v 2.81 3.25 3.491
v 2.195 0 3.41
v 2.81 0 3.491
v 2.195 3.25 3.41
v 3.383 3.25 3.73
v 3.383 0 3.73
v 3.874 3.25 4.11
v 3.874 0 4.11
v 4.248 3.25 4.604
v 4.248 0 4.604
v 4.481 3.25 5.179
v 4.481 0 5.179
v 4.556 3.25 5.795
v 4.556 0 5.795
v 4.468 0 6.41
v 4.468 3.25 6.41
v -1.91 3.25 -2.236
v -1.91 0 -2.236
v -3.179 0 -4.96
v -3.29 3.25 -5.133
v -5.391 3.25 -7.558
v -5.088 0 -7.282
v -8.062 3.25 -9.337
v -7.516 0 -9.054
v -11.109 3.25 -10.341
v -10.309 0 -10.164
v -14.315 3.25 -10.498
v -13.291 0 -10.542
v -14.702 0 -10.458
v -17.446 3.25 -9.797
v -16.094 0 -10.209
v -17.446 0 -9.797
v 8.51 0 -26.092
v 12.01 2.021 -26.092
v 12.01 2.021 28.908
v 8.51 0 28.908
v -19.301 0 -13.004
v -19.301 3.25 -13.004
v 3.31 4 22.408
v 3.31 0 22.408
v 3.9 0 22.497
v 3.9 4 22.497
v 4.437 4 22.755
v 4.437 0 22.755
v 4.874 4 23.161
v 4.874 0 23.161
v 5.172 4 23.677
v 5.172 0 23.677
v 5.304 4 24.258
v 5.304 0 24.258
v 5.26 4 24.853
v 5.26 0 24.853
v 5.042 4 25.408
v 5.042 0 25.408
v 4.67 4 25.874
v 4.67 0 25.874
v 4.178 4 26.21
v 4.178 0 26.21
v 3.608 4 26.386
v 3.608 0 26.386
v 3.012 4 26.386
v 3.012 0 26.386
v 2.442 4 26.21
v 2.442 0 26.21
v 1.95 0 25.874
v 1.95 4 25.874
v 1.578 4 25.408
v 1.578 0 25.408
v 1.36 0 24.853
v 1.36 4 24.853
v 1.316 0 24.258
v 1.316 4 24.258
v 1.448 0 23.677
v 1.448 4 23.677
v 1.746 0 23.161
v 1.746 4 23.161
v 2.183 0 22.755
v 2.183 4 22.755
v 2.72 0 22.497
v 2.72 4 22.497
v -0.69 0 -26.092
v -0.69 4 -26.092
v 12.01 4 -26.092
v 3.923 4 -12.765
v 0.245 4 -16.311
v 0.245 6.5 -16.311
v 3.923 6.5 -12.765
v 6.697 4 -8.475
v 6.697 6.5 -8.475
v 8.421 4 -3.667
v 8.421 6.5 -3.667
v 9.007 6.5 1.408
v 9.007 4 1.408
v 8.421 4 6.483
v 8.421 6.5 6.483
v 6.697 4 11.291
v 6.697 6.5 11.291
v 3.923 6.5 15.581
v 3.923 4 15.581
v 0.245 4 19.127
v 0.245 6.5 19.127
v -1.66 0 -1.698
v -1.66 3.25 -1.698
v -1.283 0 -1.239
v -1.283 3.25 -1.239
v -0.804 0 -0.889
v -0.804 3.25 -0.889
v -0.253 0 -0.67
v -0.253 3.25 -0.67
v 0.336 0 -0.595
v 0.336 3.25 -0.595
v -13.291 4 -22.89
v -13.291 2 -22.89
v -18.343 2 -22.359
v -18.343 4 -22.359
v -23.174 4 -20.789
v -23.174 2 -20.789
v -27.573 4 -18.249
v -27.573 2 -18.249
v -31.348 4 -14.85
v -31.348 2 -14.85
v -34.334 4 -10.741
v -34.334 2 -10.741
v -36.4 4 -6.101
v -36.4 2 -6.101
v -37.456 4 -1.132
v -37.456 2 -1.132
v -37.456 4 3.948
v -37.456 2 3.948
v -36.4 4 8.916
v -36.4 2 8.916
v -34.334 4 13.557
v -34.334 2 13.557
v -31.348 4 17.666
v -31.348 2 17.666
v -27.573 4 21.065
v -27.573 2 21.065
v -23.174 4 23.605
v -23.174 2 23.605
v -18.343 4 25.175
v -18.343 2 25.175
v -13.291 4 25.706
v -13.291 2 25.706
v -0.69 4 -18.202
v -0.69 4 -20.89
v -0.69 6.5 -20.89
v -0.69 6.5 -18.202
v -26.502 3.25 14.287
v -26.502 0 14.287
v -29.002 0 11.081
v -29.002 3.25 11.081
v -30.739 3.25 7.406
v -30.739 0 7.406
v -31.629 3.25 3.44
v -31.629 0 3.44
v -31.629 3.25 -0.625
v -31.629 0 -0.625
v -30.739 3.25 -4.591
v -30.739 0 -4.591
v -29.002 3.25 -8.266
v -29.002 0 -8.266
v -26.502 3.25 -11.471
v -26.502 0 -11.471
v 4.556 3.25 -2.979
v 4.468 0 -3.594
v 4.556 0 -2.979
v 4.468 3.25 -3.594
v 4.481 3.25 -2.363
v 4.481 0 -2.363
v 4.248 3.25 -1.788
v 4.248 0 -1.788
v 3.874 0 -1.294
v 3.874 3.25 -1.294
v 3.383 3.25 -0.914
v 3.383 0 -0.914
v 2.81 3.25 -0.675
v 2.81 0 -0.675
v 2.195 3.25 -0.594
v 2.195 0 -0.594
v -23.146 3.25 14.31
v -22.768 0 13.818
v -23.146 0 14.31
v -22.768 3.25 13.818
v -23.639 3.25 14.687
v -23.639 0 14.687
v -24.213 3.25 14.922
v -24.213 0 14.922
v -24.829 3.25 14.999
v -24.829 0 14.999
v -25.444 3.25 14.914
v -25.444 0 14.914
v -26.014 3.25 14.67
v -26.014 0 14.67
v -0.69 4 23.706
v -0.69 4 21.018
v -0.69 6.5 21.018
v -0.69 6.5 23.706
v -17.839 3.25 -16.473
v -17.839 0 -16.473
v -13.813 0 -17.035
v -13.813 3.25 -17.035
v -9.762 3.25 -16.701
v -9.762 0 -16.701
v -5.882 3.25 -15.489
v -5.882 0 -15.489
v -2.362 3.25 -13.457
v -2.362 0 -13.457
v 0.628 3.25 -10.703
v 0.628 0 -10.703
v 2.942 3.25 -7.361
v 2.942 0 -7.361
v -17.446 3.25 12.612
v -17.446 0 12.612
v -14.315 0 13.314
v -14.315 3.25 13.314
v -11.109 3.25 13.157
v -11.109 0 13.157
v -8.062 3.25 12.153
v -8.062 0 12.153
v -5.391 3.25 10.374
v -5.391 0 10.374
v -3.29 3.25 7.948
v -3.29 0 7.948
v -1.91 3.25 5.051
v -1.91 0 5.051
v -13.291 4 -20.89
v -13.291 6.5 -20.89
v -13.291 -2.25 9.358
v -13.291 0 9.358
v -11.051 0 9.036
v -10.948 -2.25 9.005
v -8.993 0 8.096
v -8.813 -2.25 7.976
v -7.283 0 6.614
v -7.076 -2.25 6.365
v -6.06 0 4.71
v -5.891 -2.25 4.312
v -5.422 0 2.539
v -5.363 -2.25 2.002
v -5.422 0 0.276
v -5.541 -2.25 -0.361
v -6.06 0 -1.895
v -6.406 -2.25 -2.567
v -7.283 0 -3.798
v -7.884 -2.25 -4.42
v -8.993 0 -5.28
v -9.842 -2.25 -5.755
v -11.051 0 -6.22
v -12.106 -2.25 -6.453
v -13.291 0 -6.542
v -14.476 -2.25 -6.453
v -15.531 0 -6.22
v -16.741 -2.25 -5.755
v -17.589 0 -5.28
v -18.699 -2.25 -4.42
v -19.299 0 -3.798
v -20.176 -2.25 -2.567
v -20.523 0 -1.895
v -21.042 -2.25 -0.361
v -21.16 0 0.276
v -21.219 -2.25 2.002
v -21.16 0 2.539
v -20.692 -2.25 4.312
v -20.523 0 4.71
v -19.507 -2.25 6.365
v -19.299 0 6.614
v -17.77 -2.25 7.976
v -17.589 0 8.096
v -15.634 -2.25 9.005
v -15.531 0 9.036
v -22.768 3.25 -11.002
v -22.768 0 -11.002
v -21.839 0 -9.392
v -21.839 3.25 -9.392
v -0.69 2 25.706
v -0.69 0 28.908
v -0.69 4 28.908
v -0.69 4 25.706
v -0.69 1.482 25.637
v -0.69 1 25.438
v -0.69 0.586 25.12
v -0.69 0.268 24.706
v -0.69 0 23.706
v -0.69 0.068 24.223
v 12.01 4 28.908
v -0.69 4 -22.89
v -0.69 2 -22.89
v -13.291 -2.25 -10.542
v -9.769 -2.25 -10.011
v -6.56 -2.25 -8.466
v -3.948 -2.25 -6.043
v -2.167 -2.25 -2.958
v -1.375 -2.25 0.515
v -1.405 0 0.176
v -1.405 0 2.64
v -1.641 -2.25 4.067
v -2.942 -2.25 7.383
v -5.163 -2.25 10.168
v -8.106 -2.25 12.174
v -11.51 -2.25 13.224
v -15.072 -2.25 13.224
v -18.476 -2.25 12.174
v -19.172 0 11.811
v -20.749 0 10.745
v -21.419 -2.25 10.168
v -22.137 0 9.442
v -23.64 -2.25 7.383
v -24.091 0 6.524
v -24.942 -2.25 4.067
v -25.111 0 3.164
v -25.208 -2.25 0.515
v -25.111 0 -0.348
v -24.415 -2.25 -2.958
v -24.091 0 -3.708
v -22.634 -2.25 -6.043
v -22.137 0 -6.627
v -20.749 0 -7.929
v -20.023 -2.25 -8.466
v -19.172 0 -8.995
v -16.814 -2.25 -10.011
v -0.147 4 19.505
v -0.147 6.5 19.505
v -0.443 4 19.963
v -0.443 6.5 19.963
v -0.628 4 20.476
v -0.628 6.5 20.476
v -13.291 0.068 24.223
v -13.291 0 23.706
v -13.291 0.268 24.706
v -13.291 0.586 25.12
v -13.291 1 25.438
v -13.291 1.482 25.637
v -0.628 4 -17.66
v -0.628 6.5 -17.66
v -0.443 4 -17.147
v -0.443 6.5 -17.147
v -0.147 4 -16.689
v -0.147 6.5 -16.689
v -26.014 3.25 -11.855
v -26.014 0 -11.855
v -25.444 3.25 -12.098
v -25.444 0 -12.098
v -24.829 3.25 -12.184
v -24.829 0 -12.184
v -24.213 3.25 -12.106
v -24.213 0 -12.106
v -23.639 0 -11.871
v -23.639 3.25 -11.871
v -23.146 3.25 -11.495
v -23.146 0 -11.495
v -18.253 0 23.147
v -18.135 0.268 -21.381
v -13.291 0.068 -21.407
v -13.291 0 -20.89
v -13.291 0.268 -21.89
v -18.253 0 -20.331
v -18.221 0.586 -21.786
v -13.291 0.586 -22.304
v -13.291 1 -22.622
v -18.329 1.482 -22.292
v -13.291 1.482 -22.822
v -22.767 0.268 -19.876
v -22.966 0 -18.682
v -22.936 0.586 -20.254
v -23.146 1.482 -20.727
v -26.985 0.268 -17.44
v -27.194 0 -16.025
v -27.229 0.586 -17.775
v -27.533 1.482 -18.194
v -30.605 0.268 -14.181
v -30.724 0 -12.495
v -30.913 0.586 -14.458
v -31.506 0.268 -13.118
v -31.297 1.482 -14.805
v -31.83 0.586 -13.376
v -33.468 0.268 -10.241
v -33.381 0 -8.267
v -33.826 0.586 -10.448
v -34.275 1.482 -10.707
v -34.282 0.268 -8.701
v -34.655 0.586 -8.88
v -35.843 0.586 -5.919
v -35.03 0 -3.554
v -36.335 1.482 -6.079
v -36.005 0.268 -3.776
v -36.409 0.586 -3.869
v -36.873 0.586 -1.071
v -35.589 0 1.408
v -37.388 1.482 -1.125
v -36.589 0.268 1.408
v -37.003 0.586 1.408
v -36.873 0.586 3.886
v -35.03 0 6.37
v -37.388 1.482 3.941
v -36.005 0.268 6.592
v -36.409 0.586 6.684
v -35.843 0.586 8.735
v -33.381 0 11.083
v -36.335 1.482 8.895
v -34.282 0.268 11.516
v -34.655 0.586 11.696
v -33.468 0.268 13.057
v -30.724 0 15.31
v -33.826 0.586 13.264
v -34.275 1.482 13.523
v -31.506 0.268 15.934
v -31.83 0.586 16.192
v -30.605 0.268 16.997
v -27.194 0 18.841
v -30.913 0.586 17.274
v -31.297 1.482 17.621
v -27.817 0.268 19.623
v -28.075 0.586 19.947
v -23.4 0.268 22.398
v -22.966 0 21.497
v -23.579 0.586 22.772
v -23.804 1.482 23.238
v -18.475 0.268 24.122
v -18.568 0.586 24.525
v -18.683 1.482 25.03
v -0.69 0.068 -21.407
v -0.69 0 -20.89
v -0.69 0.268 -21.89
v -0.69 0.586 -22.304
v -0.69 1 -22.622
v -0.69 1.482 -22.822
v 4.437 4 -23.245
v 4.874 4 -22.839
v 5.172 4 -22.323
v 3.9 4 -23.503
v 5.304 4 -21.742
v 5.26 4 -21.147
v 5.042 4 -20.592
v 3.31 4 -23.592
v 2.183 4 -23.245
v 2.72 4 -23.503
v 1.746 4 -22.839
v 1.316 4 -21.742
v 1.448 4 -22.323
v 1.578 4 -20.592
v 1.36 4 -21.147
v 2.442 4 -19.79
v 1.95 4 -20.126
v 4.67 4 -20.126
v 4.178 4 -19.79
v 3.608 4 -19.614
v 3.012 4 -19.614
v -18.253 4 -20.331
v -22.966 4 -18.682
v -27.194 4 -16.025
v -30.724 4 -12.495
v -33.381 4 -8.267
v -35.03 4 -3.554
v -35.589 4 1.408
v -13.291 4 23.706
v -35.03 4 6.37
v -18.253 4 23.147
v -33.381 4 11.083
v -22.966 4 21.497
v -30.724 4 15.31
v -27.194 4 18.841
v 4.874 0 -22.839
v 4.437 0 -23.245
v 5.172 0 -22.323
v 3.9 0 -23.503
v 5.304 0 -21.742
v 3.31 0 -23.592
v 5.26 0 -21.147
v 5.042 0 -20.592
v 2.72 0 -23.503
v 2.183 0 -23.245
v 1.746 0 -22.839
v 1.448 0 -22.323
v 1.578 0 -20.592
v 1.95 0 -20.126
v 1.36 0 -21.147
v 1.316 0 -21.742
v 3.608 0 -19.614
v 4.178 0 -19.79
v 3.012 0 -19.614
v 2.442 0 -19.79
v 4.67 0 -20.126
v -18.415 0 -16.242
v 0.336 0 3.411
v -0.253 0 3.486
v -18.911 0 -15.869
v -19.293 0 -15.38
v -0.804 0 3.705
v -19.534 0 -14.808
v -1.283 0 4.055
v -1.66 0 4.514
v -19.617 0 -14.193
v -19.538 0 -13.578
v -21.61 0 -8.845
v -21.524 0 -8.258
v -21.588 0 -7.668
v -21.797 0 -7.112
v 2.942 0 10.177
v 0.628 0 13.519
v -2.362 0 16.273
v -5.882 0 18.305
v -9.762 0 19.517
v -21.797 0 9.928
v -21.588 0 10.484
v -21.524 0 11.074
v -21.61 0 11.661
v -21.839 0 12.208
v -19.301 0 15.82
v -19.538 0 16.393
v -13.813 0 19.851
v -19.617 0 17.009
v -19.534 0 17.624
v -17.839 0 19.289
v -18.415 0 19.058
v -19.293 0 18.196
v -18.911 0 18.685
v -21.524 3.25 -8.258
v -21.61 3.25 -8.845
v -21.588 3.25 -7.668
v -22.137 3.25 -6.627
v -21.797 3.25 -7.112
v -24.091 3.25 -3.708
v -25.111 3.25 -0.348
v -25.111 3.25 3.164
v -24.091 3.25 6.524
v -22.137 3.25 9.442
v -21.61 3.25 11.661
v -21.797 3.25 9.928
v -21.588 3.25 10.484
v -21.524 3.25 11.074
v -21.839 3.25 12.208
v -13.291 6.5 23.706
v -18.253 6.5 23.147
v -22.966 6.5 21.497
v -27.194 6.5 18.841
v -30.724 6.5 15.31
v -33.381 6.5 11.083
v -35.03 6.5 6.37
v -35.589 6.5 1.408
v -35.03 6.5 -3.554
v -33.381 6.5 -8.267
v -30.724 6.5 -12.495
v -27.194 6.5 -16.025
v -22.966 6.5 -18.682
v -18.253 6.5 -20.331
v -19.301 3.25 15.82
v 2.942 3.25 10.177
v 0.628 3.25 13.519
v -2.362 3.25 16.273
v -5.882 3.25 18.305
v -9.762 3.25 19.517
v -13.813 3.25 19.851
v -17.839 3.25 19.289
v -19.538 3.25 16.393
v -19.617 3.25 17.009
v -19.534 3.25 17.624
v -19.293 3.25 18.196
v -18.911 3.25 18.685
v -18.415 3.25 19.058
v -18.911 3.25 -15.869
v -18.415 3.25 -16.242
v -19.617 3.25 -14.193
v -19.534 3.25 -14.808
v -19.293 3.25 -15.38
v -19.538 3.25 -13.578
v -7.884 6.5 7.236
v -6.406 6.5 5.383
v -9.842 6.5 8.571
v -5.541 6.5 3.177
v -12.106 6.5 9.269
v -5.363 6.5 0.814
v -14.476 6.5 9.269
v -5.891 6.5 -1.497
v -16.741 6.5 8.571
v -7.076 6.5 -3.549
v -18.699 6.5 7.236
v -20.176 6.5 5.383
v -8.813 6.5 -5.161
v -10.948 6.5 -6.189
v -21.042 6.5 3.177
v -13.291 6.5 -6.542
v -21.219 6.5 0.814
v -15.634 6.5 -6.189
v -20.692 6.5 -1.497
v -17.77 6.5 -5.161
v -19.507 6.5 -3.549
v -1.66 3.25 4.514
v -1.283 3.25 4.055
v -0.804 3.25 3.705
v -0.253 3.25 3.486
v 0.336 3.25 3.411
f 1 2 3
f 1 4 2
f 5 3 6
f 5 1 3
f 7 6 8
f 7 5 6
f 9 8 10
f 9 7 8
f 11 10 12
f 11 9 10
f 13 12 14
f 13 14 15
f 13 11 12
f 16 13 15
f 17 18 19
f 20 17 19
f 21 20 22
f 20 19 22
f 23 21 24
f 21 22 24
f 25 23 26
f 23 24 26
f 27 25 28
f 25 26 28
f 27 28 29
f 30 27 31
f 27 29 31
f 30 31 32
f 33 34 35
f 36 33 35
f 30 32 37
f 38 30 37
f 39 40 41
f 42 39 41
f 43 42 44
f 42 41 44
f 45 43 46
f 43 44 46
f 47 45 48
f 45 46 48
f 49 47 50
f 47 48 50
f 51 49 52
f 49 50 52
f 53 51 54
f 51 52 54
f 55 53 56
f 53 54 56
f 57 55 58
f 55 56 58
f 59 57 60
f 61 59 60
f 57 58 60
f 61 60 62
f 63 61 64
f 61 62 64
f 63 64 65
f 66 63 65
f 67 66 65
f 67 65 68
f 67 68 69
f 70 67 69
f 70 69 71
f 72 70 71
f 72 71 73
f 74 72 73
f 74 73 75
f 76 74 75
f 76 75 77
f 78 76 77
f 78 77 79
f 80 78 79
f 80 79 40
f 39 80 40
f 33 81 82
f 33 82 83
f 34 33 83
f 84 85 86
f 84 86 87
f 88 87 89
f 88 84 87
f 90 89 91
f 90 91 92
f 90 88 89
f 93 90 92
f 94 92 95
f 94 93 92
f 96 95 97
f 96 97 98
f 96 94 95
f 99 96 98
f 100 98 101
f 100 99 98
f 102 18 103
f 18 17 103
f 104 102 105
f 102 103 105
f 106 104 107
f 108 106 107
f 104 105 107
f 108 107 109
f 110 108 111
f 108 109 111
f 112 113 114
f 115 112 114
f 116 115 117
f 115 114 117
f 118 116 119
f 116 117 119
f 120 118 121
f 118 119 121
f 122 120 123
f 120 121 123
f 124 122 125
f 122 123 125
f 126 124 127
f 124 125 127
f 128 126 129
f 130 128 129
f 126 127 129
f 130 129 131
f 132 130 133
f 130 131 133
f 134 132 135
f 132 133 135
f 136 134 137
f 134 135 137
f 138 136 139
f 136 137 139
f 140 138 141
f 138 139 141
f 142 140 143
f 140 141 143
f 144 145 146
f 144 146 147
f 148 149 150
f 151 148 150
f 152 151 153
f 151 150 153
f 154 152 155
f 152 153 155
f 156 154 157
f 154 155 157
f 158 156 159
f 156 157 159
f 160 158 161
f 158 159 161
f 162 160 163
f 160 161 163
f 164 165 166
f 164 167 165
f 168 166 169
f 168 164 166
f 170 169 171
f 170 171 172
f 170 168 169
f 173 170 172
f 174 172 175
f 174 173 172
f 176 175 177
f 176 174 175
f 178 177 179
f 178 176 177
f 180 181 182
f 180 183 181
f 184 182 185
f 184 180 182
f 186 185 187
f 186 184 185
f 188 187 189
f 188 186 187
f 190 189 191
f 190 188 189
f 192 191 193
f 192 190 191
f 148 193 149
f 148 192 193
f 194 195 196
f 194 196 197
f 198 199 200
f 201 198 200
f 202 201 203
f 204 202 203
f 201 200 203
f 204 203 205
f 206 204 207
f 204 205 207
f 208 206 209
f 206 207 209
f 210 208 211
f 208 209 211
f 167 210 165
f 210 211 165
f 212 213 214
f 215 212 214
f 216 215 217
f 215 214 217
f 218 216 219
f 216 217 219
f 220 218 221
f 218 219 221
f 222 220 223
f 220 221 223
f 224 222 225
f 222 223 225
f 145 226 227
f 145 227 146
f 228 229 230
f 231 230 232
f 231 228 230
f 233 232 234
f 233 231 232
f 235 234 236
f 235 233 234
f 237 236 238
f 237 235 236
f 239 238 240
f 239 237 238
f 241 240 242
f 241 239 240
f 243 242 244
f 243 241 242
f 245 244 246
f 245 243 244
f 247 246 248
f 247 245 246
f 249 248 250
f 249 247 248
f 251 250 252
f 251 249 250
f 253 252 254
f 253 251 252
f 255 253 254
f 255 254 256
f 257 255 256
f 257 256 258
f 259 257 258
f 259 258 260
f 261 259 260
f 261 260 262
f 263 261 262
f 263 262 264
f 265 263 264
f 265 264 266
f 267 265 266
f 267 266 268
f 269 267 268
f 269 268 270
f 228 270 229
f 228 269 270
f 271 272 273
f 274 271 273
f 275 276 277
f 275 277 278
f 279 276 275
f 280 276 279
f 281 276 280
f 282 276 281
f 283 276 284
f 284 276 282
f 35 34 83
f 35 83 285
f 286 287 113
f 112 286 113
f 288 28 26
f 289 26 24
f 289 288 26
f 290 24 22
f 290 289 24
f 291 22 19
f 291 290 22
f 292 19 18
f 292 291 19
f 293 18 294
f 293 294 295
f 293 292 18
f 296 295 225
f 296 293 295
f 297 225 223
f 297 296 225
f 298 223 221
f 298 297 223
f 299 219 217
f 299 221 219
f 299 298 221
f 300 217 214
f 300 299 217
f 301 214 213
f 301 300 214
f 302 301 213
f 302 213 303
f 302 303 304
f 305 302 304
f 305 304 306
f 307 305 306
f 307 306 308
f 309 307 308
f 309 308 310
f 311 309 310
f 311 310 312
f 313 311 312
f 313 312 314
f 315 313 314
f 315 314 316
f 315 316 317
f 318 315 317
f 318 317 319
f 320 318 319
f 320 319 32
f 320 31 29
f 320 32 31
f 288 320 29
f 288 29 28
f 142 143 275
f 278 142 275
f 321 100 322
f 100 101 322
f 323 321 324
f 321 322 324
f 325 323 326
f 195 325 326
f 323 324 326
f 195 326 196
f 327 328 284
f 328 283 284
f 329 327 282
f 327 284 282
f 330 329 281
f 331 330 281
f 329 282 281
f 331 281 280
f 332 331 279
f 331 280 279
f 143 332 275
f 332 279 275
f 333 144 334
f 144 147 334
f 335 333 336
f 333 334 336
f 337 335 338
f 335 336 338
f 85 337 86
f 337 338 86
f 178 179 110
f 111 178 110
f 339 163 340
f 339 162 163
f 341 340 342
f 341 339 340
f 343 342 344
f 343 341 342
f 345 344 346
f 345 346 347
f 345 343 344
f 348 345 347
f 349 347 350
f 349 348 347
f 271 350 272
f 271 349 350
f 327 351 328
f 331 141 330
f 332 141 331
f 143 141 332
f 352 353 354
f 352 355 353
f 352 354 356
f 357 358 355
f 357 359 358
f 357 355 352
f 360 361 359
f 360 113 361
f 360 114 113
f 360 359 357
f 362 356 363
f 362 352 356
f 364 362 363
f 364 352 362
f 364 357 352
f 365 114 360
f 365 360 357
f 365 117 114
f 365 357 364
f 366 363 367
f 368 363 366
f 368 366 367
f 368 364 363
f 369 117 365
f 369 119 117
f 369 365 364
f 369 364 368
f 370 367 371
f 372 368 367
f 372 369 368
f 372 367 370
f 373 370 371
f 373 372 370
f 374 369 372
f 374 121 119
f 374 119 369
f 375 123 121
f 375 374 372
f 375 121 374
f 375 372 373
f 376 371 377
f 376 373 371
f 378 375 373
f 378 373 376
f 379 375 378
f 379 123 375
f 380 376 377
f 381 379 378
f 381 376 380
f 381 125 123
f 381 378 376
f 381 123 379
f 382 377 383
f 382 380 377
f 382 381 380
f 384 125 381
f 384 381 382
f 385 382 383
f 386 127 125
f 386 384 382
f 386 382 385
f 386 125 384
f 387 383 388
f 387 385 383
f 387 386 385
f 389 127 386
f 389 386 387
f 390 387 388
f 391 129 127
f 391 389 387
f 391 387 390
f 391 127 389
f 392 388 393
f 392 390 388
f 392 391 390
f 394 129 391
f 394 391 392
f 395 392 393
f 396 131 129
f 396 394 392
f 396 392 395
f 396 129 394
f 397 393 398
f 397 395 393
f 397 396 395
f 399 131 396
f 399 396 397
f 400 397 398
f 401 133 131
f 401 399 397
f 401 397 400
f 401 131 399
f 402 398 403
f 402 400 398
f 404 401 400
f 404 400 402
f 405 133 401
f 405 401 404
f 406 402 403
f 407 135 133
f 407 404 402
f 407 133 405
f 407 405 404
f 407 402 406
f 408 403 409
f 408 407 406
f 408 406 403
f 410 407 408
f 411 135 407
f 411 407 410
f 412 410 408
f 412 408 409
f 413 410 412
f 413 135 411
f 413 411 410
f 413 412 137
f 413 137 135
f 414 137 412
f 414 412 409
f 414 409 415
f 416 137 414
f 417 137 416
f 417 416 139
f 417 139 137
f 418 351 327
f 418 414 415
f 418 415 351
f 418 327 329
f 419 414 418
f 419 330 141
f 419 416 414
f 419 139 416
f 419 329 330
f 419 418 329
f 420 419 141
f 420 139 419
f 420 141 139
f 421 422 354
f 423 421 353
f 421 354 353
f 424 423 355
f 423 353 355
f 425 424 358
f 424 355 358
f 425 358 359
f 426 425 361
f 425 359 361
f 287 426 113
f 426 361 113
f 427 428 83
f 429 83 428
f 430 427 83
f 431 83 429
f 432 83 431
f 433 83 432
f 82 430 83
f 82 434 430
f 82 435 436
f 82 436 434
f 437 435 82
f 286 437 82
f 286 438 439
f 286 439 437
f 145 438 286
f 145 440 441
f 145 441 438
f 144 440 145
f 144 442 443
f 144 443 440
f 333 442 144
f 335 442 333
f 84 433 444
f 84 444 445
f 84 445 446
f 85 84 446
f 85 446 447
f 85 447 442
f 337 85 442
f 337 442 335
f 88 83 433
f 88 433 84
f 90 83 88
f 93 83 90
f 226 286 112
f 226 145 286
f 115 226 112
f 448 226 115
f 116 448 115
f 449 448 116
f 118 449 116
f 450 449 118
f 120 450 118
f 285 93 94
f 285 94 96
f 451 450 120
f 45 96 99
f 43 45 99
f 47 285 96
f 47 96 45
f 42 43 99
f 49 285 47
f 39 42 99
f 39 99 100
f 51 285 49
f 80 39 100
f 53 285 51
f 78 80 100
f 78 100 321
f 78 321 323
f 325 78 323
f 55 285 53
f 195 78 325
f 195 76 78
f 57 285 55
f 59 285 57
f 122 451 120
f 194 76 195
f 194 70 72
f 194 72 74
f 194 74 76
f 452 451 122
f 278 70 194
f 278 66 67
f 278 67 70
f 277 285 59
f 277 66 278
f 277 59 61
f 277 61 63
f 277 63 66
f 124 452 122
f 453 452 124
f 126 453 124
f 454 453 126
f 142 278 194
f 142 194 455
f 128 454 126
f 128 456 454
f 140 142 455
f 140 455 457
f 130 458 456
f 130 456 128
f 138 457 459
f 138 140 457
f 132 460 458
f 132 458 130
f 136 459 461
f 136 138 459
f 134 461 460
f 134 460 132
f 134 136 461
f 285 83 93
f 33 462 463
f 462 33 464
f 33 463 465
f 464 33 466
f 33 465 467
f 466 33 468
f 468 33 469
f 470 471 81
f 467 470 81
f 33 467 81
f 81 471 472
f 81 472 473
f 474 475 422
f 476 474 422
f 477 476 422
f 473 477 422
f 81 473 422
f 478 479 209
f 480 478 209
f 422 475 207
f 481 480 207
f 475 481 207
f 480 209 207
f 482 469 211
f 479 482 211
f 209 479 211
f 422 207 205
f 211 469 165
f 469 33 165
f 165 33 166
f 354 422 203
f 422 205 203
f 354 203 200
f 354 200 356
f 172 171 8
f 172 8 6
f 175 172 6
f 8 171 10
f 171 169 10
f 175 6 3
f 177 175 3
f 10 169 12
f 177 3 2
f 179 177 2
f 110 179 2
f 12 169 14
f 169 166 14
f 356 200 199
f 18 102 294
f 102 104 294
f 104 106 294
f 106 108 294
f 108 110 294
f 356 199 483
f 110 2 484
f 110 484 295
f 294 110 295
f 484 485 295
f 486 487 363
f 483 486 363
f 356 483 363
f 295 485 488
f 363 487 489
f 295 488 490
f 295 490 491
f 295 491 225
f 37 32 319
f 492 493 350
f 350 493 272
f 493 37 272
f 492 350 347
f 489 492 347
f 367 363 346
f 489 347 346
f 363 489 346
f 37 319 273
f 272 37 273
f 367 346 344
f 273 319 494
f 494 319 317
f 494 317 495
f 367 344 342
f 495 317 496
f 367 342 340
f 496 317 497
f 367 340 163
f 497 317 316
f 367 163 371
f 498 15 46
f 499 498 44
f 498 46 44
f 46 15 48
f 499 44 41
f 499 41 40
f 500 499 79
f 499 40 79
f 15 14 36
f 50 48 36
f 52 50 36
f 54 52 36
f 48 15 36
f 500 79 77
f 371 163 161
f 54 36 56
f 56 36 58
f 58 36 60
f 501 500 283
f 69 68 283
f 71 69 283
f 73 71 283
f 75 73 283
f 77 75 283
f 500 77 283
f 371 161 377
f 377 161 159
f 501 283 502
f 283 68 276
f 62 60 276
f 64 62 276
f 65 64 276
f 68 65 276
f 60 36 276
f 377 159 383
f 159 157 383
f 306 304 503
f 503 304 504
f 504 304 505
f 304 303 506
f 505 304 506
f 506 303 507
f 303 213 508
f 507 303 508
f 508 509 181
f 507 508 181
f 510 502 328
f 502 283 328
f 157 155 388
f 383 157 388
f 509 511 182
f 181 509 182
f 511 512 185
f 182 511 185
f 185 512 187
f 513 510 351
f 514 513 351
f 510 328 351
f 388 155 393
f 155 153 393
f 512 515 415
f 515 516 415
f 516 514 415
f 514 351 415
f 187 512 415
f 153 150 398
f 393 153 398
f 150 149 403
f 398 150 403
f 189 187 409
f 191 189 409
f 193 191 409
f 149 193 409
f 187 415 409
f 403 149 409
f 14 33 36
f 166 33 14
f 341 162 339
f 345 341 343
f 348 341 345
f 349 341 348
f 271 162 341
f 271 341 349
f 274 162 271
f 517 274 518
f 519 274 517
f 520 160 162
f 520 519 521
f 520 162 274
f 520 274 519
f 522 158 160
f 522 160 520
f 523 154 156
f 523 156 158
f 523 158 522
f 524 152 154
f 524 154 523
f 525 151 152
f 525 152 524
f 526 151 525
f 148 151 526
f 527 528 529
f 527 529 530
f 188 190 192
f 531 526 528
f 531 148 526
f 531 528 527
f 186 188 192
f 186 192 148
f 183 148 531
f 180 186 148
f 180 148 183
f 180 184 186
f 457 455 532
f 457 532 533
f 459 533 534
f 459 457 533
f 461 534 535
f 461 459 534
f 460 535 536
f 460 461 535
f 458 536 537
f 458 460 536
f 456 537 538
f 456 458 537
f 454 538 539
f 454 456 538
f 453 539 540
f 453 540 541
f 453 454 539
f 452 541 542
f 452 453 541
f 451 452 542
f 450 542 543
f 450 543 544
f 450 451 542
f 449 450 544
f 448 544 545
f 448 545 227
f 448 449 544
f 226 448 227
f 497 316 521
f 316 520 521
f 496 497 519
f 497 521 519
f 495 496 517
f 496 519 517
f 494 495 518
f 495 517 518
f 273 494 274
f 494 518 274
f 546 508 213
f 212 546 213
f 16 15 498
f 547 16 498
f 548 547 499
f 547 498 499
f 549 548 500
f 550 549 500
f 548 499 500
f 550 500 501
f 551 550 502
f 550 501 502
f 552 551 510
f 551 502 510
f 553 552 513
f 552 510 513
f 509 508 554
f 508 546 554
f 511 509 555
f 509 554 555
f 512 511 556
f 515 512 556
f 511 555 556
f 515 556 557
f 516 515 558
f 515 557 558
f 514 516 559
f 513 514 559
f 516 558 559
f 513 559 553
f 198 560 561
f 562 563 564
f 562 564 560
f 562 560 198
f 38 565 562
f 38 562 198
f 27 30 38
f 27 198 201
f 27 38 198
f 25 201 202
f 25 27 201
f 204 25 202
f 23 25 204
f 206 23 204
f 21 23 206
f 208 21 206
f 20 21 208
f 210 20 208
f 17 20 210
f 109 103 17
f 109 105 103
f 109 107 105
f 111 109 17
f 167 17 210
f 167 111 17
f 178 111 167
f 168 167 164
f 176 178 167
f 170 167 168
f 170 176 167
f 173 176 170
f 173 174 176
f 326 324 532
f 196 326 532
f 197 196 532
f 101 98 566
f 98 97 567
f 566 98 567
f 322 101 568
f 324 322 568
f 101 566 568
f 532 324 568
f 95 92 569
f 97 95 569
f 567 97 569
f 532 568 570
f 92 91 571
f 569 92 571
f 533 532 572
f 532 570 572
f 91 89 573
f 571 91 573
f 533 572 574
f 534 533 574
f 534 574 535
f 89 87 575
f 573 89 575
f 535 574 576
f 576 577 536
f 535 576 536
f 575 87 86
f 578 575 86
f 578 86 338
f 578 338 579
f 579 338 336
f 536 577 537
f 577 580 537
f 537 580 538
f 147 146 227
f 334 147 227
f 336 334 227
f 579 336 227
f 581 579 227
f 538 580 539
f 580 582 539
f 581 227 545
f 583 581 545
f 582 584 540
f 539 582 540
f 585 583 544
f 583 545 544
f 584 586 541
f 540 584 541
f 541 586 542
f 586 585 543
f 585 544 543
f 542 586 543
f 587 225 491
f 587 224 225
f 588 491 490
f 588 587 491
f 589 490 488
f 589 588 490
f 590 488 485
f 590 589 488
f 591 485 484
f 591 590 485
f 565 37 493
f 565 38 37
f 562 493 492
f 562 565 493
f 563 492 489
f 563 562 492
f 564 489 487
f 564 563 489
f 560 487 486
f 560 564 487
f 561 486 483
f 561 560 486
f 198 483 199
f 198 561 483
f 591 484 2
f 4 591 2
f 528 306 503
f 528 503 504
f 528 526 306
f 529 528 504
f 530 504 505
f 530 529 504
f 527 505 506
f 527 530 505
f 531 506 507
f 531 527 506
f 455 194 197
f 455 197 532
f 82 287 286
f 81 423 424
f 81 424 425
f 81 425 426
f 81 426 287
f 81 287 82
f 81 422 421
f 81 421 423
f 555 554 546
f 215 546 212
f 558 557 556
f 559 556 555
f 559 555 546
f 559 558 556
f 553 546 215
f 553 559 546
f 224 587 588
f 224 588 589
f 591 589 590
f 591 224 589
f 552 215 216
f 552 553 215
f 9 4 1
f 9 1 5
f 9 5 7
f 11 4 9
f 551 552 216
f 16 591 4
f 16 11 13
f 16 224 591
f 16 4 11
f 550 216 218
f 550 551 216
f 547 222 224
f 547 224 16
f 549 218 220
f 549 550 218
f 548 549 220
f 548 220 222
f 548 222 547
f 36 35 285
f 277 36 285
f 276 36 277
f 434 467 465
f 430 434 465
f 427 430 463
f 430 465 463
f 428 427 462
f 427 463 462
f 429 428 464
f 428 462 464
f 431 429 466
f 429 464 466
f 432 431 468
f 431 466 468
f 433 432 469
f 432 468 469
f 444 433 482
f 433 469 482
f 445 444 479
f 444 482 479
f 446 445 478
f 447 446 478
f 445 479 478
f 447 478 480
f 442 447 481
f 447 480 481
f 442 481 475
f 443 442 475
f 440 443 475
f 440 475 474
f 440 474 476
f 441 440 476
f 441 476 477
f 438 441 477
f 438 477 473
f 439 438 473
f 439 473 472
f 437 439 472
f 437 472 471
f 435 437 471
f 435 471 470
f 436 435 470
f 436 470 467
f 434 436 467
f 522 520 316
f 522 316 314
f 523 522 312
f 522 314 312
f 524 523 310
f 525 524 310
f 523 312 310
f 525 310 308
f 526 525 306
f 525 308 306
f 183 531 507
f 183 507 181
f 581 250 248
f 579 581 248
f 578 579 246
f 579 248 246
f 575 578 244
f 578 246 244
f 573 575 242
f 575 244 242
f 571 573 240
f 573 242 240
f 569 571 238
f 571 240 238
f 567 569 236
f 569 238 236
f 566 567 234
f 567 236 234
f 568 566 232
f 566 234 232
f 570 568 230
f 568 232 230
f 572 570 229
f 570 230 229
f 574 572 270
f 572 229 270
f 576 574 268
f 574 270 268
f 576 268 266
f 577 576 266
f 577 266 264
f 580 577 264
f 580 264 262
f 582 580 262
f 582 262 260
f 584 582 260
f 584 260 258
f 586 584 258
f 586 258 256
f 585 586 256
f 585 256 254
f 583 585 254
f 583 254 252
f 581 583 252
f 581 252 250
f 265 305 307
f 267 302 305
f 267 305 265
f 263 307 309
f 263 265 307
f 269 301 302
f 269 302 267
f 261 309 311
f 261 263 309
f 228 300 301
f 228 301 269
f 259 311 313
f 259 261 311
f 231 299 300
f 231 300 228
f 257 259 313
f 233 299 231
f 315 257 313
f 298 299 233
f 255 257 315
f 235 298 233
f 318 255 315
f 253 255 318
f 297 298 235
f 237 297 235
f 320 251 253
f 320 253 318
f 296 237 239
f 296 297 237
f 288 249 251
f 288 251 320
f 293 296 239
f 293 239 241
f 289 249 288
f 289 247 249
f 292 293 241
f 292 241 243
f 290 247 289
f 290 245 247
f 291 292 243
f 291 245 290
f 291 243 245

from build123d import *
from build123d.topology import SkipClean

# Parameters (mm, degrees)
BOSS_EXTRUDE1_DEPTH = 4
BOSS_EXTRUDE2_DEPTH = 2.5
SKETCH3_R           = 7.95
CUT_EXTRUDE1_DEPTH  = 9.25
SKETCH4_R           = 2
CUT_EXTRUDE2_DEPTH  = 9.25
CUT_EXTRUDE3_DEPTH  = 3.25
FILLET1_R           = 2.36
CHAMFER1_SIZE       = 3.5
CHAMFER1_SIZE2      = 2.020725942
BOSS_EXTRUDE4_DEPTH = 4
FILLET4_R           = 2
BOSS_EXTRUDE5_START = 2.25
SKETCH11_R          = 11.95
BOSS_EXTRUDE5_DEPTH = 2.25
CUT_EXTRUDE4_START  = -2.25
SKETCH12_R          = 7.95
CUT_EXTRUDE4_DEPTH  = 2.25
FILLET5_R           = 2.38


with BuildPart() as part:
    # Sketch1 → Boss-Extrude1 (new body)
    with BuildSketch(Plane(origin=(0, 0, 0), x_dir=(1, 0, 0), z_dir=(0, 1, 0))):
        with BuildLine():
            Line((-13.29118379, 20.889836125), (-0.68999579, 20.889836125))
            Line((-0.68999579, 20.889836125), (-0.68999579, 26.09210312))
            Line((-0.68999579, 26.09210312), (12.01000421, 26.09210312))
            Line((12.01000421, 26.09210312), (12.01000421, -28.90789688))
            Line((12.01000421, -28.90789688), (-0.68999579, -28.90789688))
            Line((-0.68999579, -28.90789688), (-0.68999579, -23.705629885))
            Line((-0.68999579, -23.705629885), (-13.29118379, -23.705629885))
            ThreePointArc((-13.29118379, -23.705629885), (-35.588916795, -1.40789688), (-13.29118379, 20.889836125))
        make_face()
    extrude(amount=BOSS_EXTRUDE1_DEPTH)

    # Sketch2 → Boss-Extrude2 (add)
    with BuildSketch(Plane(origin=(0, 4, 0), x_dir=(1, 0, 0), z_dir=(0, 1, 0))):
        with BuildLine():
            Line((-13.29118379, 20.889836125), (-0.68999579, 20.889836125))
            Line((-0.68999579, 20.889836125), (-0.68999579, 16.987726462))
            ThreePointArc((-0.68999579, 16.987726462), (9.006549215, -1.40789688), (-0.68999579, -19.803520222))
            Line((-0.68999579, -19.803520222), (-0.68999579, -23.705629885))
            Line((-0.68999579, -23.705629885), (-13.29118379, -23.705629885))
            ThreePointArc((-13.29118379, -23.705629885), (-35.588916795, -1.40789688), (-13.29118379, 20.889836125))
        make_face()
    extrude(amount=BOSS_EXTRUDE2_DEPTH)

    # Sketch3 → Cut-Extrude1 (cut)
    with BuildSketch(Plane.XZ):
        with Locations(Location((-13.29118379, 1.40789688, 0), (0, 0, 270))):
            Circle(SKETCH3_R)
    extrude(amount=-CUT_EXTRUDE1_DEPTH, mode=Mode.SUBTRACT)

    # Sketch4 → Cut-Extrude2 (cut)
    with BuildSketch(Plane.XZ):
        with Locations(Location((3.31000421, 24.40789688, 0), (0, 0, 270))):
            Circle(SKETCH4_R)
        with Locations(Location((3.310004206, -21.59210312, 0), (0, 0, 270))):
            Circle(SKETCH4_R)
    extrude(amount=-CUT_EXTRUDE2_DEPTH, mode=Mode.SUBTRACT)

    # Sketch5 → Cut-Extrude3 (cut)
    with BuildSketch(Plane.XZ):
        with BuildLine():
            ThreePointArc((-20.917233099, -7.792422241), (-25.24118379, 1.40789688), (-20.917233099, 10.608216001))
            Line((-20.917233099, 10.608216001), (-24.193916765, 16.291878661))
            ThreePointArc((-24.193916765, 16.291878661), (-31.74118379, 1.40789688), (-24.193916765, -13.476084902))
            Line((-24.193916765, -13.476084902), (-20.917233099, -7.792422241))
        make_face()
        with BuildLine():
            Line((-20.729723635, 18.291931497), (-17.445869217, 12.612408873))
            ThreePointArc((-17.445869217, 12.612408873), (-7.31618379, 11.756900455), (-1.510449053, 3.412089752))
            Line((-1.510449053, 3.412089752), (5.05008903, 3.407949716))
            ThreePointArc((5.05008903, 3.407949716), (-4.06618379, 17.38606558), (-20.729723635, 18.291931497))
        make_face()
        with BuildLine():
            ThreePointArc((-1.510449053, -0.596295992), (-7.31618379, -8.941106696), (-17.445869217, -9.796615113))
            Line((-17.445869217, -9.796615113), (-20.729723635, -15.476137738))
            ThreePointArc((-20.729723635, -15.476137738), (-4.06618379, -14.57027182), (5.05008903, -0.592155956))
            Line((5.05008903, -0.592155956), (-1.510449053, -0.596295992))
        make_face()
    extrude(amount=-CUT_EXTRUDE3_DEPTH, mode=Mode.SUBTRACT)

    # Fillet1
    fillet1_edges = [part.edges().sort_by_distance(p)[0] for p in [
        (-20.917233099, 1.625, 10.608216001),
        (-20.917233099, 1.625, -7.792422241),
        (-24.193916765, 1.625, -13.476084902),
        (-24.193916765, 1.625, 16.291878661),
        (5.05008903, 1.625, 3.407949716),
        (-1.510449053, 1.625, 3.412089752),
        (-20.729723635, 1.625, 18.291931497),
        (-1.510449053, 1.625, -0.596295992),
        (5.05008903, 1.625, -0.592155956),
        (-20.729723635, 1.625, -15.476137738),
    ]]
    fillet(fillet1_edges, radius=FILLET1_R)

    # Chamfer1
    chamfer1_edges = [part.edges().sort_by_distance(p)[0] for p in [
        (12.01000421, 0, 1.40789688),
    ]]
    chamfer1_side = [part.faces().sort_by_distance(p)[0] for p in [
        (-3.702499267, 0, 18.015985651),
    ]]
    chamfer(chamfer1_edges, length=CHAMFER1_SIZE, length2=CHAMFER1_SIZE2, reference=chamfer1_side[0])

    # Sketch10 → Boss-Extrude4 (add)
    with BuildSketch(Plane.XZ):
        with BuildLine():
            Line((-0.68999579, -22.889836125), (-13.29118379, -22.889836125))
            ThreePointArc((-13.29118379, -22.889836125), (-37.588916795, 1.40789688), (-13.29118379, 25.705629885))
            Line((-13.29118379, 25.705629885), (-0.68999579, 25.705629885))
            Line((-0.68999579, 25.705629885), (-0.68999579, 23.705629885))
            Line((-0.68999579, 23.705629885), (-13.29118379, 23.705629885))
            ThreePointArc((-13.29118379, 23.705629885), (-35.588916795, 1.40789688), (-13.29118379, -20.889836125))
            Line((-13.29118379, -20.889836125), (-0.68999579, -20.889836125))
            Line((-0.68999579, -20.889836125), (-0.68999579, -22.889836125))
        make_face()
    extrude(amount=-BOSS_EXTRUDE4_DEPTH)

    # Fillet4
    fillet4_edges = [part.edges().sort_by_distance(p)[0] for p in [
        (-6.99058979, 0, 25.705629885),
        (-37.588916795, 0, 1.40789688),
        (-6.99058979, 0, -22.889836125),
    ]]
    fillet(fillet4_edges, radius=FILLET4_R)

    # Sketch11 → Boss-Extrude5 (add)
    with SkipClean():  # the faces are left unmerged after this step: merging them gives an invalid solid
        with BuildSketch(Plane.XZ.offset(BOSS_EXTRUDE5_START)):
            with Locations(Location((-13.29118379, 1.40789688, 0), (0, 0, 270))):
                Circle(SKETCH11_R)
        extrude(amount=-BOSS_EXTRUDE5_DEPTH)

    # Sketch12 → Cut-Extrude4 (cut)
    with SkipClean():  # the faces are left unmerged after this step: merging them gives an invalid solid
        with BuildSketch(Plane(origin=(0, 0, 0), x_dir=(1, 0, 0), z_dir=(0, 1, 0)).offset(CUT_EXTRUDE4_START)):
            with Locations(Location((-13.29118379, -1.40789688, 0), (0, 0, 270))):
                Circle(SKETCH12_R)
        extrude(amount=CUT_EXTRUDE4_DEPTH, mode=Mode.SUBTRACT)

    # Fillet5
    fillet5_edges = [part.edges().sort_by_distance(p)[0] for p in [
        (-0.68999579, 5.25, 19.803520222),
        (-0.68999579, 5.25, -16.987726462),
    ]]
    fillet(fillet5_edges, radius=FILLET5_R)


solid = part.part
